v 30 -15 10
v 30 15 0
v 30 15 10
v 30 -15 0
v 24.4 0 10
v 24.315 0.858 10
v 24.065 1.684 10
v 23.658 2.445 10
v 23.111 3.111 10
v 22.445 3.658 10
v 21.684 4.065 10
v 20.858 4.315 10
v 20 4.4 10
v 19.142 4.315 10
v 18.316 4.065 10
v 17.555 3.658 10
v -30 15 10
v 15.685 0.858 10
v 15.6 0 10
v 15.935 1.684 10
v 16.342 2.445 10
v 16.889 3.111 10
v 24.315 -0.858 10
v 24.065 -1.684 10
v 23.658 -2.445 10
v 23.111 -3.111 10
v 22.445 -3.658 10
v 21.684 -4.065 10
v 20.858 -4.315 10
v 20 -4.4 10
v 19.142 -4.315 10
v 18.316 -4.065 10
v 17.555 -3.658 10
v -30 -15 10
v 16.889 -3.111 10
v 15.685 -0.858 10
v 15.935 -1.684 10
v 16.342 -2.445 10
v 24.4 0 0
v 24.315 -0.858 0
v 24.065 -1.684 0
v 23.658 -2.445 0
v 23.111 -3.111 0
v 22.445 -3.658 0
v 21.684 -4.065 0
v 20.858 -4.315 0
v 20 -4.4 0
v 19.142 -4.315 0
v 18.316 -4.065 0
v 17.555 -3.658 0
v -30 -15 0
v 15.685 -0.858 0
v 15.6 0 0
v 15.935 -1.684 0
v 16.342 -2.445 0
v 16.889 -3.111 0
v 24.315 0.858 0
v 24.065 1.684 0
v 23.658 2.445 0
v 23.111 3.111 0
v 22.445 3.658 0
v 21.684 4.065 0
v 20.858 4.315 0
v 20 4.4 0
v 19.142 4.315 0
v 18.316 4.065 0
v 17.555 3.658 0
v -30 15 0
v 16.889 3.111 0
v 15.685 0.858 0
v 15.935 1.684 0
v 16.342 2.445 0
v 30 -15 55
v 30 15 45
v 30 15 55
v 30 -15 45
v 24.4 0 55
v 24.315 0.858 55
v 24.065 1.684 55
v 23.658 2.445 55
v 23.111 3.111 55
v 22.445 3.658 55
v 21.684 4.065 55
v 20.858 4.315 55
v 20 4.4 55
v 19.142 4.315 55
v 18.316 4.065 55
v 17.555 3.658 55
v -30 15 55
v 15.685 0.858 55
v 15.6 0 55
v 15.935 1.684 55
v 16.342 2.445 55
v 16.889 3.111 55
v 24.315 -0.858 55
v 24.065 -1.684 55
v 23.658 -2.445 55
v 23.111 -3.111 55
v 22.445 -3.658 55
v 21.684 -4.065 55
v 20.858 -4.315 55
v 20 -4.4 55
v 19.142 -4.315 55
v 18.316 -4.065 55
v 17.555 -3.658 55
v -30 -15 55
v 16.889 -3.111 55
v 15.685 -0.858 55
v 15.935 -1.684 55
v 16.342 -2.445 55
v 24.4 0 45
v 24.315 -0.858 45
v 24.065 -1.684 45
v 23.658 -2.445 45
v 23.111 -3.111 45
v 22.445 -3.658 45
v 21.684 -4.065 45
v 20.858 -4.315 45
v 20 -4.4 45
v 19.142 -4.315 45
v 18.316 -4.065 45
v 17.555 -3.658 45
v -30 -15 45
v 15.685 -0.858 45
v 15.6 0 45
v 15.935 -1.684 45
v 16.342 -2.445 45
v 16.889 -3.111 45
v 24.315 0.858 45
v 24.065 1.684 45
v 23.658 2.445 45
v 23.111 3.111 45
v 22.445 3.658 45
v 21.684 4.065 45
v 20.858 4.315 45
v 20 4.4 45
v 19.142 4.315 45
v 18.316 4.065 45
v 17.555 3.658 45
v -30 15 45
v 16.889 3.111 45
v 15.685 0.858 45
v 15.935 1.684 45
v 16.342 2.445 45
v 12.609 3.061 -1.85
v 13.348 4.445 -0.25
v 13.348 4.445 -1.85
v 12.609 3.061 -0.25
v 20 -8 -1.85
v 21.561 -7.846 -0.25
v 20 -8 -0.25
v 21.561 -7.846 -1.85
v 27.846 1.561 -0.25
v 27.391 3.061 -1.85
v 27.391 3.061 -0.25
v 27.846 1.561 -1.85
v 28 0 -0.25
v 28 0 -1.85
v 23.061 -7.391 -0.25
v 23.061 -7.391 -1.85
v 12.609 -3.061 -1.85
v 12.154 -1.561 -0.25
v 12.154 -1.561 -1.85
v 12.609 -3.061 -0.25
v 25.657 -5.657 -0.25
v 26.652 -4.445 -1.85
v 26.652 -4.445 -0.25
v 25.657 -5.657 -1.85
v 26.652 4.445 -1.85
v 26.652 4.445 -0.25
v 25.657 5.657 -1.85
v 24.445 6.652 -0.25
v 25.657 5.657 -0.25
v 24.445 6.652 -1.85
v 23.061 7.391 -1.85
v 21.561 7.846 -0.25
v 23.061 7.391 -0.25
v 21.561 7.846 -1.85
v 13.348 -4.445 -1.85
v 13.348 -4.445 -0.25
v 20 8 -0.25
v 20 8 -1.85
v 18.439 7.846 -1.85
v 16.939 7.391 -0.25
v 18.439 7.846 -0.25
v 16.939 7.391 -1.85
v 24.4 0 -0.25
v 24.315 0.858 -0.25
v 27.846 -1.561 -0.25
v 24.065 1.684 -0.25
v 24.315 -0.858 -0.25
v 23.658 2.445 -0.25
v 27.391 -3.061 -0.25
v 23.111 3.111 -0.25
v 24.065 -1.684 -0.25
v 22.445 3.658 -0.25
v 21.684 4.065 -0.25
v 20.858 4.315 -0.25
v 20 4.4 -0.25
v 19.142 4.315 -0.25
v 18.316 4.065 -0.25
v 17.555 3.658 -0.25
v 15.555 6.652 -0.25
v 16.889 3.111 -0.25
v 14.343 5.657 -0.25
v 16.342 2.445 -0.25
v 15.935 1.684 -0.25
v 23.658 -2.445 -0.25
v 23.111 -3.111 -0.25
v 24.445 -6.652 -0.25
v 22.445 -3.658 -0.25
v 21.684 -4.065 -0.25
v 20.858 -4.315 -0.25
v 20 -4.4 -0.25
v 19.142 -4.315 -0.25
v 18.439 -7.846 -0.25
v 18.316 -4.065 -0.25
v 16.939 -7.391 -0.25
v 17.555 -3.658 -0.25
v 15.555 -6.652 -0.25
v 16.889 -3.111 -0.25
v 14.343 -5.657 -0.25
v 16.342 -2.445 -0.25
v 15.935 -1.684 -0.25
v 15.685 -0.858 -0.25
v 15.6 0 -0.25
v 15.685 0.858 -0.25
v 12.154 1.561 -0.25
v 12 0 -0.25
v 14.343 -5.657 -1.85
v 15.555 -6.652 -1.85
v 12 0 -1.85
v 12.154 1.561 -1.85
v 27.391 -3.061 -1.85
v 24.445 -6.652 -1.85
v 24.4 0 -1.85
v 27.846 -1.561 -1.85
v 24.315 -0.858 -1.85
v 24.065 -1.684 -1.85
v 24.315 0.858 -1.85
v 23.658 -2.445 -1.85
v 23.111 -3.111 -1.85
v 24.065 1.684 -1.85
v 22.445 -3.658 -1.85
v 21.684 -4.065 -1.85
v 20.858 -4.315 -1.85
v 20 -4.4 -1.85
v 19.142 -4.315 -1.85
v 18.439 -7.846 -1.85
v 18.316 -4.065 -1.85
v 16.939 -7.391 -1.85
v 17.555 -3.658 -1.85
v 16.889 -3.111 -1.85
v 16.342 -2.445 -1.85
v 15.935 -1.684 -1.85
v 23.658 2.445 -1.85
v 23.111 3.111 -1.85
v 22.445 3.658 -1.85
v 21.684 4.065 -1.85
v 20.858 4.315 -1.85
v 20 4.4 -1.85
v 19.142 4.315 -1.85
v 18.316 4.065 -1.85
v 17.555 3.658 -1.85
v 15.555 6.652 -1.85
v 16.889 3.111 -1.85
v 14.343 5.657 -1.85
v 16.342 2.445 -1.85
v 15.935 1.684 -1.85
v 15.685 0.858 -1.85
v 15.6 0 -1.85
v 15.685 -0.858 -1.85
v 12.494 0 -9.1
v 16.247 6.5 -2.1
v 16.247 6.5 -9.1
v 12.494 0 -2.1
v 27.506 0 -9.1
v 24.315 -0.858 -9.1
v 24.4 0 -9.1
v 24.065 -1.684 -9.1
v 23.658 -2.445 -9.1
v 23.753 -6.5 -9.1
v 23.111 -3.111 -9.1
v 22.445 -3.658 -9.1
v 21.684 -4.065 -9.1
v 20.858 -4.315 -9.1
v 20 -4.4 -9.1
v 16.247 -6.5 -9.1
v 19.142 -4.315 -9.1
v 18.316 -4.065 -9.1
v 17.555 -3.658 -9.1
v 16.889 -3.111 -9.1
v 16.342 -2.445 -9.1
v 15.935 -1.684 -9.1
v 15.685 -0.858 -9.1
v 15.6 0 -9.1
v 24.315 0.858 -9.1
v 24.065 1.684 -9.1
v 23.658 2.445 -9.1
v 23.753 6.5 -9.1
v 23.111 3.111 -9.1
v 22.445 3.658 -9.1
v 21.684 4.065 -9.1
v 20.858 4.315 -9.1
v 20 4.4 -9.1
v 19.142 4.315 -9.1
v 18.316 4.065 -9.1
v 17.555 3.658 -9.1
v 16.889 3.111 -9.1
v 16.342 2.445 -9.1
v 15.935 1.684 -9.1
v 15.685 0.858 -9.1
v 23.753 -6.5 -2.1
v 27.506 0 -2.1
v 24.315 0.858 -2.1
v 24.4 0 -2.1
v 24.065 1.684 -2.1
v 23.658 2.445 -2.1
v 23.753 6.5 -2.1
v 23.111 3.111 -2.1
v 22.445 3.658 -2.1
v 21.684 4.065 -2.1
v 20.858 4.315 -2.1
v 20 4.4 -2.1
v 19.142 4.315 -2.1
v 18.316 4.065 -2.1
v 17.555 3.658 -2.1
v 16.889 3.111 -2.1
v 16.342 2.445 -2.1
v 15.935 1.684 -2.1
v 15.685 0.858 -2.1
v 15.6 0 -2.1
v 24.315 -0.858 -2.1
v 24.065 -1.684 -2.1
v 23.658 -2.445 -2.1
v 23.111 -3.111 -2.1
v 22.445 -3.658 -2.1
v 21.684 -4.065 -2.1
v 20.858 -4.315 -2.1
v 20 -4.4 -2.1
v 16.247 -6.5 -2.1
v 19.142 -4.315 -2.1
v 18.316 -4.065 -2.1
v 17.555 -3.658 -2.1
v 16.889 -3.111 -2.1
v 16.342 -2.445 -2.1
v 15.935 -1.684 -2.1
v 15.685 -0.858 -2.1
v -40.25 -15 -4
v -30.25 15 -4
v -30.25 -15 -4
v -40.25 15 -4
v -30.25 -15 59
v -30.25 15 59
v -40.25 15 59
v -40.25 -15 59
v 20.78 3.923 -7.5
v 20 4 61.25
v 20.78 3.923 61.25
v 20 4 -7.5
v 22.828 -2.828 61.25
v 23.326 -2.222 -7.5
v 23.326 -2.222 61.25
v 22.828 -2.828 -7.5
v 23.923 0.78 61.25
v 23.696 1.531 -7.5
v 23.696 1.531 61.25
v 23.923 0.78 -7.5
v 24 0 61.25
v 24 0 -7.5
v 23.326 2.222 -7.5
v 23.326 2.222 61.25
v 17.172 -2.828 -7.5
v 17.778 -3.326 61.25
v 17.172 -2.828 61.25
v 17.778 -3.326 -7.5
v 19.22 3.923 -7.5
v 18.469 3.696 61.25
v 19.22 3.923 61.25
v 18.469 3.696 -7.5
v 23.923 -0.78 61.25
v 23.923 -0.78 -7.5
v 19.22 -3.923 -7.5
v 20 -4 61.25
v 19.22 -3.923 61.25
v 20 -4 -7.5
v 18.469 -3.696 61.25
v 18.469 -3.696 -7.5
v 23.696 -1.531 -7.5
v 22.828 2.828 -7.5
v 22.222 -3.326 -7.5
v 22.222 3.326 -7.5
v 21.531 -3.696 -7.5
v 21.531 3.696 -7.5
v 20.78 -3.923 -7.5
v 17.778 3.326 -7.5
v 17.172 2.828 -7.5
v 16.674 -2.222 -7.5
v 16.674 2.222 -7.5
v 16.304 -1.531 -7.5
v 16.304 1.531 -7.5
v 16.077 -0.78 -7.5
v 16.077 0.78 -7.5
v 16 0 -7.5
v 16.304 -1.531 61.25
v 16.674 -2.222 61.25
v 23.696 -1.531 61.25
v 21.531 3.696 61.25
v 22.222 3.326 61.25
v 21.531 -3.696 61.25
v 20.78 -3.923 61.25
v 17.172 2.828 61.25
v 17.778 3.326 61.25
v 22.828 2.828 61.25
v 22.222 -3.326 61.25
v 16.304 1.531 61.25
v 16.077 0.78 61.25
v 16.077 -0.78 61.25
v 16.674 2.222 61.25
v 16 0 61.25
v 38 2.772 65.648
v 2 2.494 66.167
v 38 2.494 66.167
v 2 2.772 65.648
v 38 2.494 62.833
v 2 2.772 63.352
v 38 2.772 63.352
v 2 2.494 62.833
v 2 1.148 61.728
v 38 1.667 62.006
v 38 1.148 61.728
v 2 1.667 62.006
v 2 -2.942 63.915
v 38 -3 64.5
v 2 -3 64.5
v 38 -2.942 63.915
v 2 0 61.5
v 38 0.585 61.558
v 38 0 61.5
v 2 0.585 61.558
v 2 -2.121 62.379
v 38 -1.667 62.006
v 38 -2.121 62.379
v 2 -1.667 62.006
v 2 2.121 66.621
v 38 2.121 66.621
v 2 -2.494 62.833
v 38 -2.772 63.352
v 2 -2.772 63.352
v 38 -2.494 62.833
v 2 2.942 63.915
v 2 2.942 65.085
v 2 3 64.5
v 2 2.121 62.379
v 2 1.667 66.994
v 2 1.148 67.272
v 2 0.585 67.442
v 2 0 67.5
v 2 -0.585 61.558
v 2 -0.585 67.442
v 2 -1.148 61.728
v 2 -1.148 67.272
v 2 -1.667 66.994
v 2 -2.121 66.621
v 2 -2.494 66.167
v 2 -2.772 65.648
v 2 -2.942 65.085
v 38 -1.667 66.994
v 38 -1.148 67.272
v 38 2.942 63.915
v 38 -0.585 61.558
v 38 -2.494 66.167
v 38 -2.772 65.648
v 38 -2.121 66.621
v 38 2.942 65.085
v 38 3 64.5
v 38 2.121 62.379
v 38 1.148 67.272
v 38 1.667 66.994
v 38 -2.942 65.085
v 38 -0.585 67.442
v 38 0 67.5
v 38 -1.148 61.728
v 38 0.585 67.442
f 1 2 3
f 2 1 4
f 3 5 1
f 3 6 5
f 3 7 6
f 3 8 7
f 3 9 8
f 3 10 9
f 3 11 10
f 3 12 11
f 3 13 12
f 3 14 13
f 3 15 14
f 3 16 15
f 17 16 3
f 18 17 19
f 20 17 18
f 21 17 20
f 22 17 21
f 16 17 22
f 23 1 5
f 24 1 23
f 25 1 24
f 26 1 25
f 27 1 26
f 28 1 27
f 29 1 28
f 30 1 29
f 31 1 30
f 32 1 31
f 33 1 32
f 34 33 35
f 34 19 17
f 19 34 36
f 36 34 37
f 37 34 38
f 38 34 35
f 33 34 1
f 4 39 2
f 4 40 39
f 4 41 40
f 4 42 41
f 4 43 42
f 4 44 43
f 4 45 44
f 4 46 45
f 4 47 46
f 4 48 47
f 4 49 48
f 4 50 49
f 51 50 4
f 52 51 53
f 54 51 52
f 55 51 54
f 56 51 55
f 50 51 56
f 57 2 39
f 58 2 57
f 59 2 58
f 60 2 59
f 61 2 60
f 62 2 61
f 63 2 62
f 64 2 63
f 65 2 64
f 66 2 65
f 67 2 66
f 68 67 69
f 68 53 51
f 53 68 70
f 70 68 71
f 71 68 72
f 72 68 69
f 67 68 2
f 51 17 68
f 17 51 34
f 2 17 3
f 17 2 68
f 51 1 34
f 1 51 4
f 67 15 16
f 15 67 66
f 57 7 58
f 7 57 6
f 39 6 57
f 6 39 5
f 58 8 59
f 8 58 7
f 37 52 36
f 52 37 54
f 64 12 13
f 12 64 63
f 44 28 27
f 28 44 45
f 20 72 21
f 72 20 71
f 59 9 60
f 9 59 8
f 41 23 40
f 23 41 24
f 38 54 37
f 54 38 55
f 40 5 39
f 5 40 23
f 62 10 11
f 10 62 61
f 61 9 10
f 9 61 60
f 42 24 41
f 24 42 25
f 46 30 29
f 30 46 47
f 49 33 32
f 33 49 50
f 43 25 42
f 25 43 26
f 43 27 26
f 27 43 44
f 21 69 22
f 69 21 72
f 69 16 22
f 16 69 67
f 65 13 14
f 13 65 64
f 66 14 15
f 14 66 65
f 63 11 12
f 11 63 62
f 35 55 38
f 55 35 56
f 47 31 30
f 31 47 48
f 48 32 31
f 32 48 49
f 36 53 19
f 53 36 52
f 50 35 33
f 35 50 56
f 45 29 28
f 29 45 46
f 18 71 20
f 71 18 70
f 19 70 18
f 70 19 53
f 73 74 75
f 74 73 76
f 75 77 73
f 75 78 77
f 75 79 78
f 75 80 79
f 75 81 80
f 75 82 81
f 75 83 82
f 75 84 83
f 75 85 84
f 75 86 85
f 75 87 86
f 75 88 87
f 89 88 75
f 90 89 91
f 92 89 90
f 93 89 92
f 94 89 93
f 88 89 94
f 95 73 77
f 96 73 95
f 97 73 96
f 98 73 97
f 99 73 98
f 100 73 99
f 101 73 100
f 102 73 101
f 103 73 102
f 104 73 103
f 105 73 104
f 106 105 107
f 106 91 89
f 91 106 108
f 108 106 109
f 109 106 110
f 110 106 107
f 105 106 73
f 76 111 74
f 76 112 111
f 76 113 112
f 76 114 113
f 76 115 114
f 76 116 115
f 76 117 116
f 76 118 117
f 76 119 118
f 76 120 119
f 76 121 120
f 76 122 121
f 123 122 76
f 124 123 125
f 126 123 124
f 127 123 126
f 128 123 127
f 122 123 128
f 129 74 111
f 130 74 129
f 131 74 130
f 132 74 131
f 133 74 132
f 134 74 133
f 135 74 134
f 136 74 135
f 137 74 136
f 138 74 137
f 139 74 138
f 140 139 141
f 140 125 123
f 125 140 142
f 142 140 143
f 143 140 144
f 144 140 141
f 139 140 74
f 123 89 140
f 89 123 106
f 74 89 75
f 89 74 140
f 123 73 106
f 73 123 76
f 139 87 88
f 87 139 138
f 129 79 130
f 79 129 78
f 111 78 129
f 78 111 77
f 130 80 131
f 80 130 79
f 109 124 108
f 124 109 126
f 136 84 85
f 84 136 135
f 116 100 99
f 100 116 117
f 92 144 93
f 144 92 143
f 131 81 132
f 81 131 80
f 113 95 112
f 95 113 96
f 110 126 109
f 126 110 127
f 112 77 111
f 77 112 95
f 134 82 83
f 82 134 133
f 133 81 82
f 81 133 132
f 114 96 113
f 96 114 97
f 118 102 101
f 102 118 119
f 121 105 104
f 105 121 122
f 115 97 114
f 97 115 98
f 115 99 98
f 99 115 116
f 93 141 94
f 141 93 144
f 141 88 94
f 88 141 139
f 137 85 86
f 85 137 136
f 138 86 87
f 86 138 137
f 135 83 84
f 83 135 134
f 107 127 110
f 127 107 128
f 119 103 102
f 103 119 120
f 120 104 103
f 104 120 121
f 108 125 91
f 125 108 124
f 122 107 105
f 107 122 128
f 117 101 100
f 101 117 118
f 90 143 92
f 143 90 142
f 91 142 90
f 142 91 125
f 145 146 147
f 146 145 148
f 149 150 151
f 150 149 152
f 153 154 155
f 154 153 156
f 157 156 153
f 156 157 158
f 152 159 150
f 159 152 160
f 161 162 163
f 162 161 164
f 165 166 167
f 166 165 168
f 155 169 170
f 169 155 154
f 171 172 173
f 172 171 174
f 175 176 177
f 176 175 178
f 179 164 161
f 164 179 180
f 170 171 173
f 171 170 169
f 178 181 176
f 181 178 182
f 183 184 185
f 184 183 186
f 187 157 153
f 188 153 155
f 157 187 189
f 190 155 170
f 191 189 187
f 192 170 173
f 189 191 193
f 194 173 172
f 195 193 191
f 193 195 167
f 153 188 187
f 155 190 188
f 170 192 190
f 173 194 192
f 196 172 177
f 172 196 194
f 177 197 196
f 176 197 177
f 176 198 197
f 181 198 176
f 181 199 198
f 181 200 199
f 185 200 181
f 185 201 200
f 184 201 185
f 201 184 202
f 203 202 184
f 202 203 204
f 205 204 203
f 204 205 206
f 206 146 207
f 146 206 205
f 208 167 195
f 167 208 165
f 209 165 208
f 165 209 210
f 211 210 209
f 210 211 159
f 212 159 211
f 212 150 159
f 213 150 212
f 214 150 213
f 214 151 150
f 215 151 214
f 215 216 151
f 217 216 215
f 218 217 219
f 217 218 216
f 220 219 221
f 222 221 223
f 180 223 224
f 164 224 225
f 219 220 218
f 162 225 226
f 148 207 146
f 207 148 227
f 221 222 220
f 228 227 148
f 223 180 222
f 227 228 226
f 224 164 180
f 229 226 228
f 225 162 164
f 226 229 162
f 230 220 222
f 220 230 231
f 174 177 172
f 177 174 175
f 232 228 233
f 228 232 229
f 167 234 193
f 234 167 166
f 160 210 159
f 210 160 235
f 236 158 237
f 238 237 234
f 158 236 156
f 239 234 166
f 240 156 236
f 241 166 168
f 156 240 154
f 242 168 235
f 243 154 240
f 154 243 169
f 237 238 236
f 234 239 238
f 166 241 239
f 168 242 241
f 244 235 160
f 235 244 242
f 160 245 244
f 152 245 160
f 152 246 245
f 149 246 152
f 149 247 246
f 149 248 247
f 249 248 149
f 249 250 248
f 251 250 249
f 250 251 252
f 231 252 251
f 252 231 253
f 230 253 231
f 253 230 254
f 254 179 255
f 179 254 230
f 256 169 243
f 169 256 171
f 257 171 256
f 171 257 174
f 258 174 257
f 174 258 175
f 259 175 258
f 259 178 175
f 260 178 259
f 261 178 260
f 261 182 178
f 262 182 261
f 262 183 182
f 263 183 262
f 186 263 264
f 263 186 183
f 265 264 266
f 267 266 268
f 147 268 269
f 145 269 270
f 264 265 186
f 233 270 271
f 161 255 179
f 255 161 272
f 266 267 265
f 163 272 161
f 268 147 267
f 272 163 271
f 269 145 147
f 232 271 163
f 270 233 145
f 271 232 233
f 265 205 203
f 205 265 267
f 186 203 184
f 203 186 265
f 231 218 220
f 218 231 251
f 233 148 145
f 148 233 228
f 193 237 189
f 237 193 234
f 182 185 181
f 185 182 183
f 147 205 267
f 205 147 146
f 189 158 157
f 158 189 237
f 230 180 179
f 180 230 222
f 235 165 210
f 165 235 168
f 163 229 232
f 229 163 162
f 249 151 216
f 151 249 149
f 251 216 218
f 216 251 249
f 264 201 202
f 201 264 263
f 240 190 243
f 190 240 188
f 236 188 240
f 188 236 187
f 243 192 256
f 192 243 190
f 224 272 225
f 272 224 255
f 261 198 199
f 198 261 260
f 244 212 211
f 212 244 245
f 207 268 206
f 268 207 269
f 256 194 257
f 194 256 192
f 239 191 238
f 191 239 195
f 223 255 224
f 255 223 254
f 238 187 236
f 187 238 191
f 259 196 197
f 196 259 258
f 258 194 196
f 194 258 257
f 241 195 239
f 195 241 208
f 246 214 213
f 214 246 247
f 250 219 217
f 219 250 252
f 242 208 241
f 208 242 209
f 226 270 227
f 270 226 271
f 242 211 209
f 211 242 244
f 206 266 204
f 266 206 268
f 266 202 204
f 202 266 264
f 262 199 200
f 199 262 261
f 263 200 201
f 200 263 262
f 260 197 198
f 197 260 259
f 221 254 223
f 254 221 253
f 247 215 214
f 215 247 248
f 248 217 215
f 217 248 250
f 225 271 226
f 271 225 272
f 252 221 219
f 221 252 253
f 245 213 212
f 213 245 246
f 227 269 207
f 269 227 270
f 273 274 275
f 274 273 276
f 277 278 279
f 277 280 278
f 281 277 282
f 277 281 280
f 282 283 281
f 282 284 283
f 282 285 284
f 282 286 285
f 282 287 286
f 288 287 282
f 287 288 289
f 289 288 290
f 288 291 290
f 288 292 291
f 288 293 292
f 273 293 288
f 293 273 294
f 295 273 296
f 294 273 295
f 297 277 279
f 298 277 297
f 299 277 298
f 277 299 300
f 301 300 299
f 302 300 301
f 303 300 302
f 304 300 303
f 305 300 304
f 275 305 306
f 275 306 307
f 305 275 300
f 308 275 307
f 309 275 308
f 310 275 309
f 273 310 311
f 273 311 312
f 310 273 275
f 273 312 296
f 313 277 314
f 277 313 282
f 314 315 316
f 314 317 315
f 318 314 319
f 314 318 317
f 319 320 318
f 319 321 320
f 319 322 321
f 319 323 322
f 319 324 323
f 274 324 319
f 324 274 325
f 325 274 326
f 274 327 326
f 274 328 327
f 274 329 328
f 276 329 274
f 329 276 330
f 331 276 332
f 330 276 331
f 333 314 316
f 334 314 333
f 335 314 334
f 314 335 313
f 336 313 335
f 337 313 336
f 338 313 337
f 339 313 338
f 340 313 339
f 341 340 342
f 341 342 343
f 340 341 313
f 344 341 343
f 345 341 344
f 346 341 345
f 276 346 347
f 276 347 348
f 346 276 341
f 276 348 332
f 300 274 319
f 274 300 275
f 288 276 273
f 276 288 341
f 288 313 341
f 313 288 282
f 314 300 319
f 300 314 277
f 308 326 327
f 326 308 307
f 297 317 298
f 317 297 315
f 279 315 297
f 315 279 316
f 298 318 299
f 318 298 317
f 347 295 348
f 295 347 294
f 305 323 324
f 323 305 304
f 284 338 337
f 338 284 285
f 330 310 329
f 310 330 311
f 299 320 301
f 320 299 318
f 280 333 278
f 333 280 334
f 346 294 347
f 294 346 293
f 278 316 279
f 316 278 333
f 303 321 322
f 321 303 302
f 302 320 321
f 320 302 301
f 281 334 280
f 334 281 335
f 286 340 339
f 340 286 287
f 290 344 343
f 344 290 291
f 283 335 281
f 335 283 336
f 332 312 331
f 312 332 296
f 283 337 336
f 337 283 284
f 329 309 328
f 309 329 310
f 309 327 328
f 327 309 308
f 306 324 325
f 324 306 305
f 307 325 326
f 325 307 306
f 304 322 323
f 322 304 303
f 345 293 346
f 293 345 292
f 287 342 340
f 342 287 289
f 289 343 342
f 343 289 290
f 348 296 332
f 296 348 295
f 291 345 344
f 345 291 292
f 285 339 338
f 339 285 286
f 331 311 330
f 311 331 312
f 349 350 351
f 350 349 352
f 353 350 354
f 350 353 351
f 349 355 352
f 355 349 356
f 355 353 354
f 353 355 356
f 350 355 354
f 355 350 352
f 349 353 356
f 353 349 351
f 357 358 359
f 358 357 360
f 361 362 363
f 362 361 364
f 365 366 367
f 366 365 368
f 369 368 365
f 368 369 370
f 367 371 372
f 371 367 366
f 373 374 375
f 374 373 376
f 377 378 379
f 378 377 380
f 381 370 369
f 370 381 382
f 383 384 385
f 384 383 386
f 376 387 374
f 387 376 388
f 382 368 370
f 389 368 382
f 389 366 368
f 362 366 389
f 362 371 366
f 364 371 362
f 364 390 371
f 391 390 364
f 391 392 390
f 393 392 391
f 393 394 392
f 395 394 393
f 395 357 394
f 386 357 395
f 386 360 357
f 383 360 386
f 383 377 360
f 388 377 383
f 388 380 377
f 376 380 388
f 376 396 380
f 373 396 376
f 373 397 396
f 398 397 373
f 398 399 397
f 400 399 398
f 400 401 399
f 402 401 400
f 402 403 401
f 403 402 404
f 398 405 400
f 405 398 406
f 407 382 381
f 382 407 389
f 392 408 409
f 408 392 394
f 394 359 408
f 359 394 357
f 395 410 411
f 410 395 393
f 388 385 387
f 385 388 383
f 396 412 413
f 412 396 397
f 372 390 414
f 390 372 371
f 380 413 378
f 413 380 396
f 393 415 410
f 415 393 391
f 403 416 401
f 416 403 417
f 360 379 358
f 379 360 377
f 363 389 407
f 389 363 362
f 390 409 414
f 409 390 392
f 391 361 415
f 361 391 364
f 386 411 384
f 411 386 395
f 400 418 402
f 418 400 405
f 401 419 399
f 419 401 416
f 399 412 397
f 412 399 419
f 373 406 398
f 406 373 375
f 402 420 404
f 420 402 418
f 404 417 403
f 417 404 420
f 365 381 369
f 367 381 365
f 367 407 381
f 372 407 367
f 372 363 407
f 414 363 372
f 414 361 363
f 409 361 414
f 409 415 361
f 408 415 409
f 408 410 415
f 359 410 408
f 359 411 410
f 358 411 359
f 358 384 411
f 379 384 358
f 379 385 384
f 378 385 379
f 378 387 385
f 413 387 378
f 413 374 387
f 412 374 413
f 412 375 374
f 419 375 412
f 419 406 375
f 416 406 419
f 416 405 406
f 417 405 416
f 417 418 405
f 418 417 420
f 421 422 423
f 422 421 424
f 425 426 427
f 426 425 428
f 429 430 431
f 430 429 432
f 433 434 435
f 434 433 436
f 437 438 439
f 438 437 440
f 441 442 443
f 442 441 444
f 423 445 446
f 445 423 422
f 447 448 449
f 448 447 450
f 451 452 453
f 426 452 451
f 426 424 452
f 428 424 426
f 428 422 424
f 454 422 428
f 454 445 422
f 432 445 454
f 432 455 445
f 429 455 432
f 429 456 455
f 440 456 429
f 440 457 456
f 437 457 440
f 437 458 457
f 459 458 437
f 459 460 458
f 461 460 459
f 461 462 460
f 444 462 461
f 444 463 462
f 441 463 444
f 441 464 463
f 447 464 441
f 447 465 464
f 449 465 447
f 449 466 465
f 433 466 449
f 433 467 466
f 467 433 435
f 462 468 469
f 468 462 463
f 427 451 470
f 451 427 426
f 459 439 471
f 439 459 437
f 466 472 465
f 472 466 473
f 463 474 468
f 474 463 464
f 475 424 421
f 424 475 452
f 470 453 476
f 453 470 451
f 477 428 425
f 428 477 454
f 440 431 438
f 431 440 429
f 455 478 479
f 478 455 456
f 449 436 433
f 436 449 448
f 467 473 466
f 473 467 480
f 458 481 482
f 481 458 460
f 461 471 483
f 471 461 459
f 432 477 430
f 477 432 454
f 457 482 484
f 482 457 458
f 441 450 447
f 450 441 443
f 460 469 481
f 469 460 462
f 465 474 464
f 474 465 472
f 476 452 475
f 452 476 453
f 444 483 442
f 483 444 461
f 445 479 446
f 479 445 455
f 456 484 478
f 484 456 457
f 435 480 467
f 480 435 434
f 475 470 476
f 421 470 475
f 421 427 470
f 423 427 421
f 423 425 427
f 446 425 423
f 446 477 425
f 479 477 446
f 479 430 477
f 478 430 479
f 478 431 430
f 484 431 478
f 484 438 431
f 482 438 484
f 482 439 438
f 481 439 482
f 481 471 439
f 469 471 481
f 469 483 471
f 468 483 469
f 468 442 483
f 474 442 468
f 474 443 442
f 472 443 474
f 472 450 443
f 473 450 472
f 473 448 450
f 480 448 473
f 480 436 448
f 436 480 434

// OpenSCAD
$fn = 32;

// ------------------------------------------------------------------------
// C clamp: throat 45 mm, screw d8
// Every part is its own module, assembly() places every instance.
// ------------------------------------------------------------------------

// --- part 1 ---
module clamp_arm() {
  difference() {
    translate([-30, -15, 0]) cube([60, 30, 10]);
    translate([20, 0, -1]) cylinder(h = 12, d = 8.8);
  }
}

// --- part 2 ---
module clamp_spine() {
  difference() {
    translate([-31.5, -15, 0]) cube([63, 30, 10]);
  }
}

// --- part 3 ---
module clamp_screw() {
  translate([0, 0, -34.375]) cylinder(h = 68.75, d = 8);
}

// --- part 4 ---
module clamp_washer() {
  difference() {
      translate([0, 0, 0]) cylinder(h = 1.6, d = 16);
      translate([0, 0, -1]) cylinder(h = 3.6, d = 8.8);
    }
}

// --- part 5 ---
module clamp_nut() {
  difference() {
    linear_extrude(height = 7) polygon(points = [[7.506, 0], [3.753, 6.5], [-3.753, 6.5], [-7.506, 0], [-3.753, -6.5], [3.753, -6.5]]);
    translate([0, 0, -1]) cylinder(h = 9, d = 8.8);
  }
}

// --- part 6 ---
module tommy_bar() {
  translate([0, 0, -18]) cylinder(h = 36, d = 6);
}

// --- assembly ---
module assembly() {
  color([0.80, 0.24, 0.20]) translate([0, 0, 0]) rotate([0, 0, 0]) clamp_arm();
  color([0.20, 0.45, 0.75]) translate([0, 0, 45]) rotate([0, 0, 0]) clamp_arm();
  color([0.25, 0.62, 0.32]) translate([-40.25, 0, 27.5]) rotate([0, 90, 0]) clamp_spine();
  color([0.92, 0.70, 0.18]) translate([20, 0, 26.875]) rotate([0, 0, 0]) clamp_screw();
  color([0.58, 0.35, 0.70]) translate([20, 0, -1.85]) rotate([0, 0, 0]) clamp_washer();
  color([0.16, 0.66, 0.66]) translate([20, 0, -9.1]) rotate([0, 0, 0]) clamp_nut();
  color([0.85, 0.48, 0.18]) translate([20, 0, 64.5]) rotate([0, 90, 0]) tommy_bar();
}

assembly();
